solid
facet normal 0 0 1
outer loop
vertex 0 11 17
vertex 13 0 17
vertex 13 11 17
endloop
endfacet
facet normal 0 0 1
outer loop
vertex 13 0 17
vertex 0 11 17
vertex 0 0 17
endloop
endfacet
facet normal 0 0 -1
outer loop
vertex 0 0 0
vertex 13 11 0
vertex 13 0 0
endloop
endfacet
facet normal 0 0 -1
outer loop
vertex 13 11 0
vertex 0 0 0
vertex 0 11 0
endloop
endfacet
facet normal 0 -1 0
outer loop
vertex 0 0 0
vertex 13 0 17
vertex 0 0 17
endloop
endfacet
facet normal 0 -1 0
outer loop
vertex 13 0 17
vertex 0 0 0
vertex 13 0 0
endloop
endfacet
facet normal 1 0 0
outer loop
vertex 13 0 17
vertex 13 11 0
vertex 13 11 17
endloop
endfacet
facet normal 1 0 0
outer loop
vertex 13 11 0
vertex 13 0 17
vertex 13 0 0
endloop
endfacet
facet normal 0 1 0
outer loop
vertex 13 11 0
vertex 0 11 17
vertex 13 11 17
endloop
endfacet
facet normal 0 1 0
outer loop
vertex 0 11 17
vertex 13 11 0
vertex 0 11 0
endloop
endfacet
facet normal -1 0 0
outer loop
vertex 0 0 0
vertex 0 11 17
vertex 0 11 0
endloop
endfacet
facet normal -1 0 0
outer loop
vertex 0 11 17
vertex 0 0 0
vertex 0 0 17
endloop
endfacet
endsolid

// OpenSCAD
// Generated by SolidPython 1.0.1 on 2020-07-29 00:46:55


cube(size = [13, 11, 17]);
/***********************************************
*********      SolidPython code:      **********
************************************************
 
# import packages: SolidPython
from solid import *
from solid.utils import *
from itertools import chain, combinations, permutations


class Resize:

    def __init__(self, scad_file):
        self.scad_file = scad_file
        #self.scad_file = import_scad(scad_file)
        # cone/cylinder param:
        self.r1 = 0
        self.r2 = 0
        self.h = 0
        # rectangular prism param:
        self.w = 0
        self.l = 0
        # ellipse param:
        self.r = 0

    # import OpenScad code (file name corresponds to shape)


    # classify shape + parameters
    def assign(self, param1, param2, param3):
        if self.scad_file == 'cone.scad':
            self.r1 = param1
            self.r2 = param2
            self.h = param3
        elif self.scad_file == 'cylinder.scad':
            self.r1 = param1
            self.r2 = param2
            self.h = param3
        elif self.scad_file == 'rectangularPrism.scad':
            self.h = param1
            self.l = param2
            self.w = param3
        else:
            self.r = param1
            self.h = param2

    # resize parameters
    def iterate(self):
        x = range(3, 20, 2)
        i = 1
        if self.scad_file == 'cone.scad':
            tempList = list(permutations(x, 2))
            for temp in tempList:
                param1 = temp[0]
                param2 = temp[1]
                filepath = 'produced_scad_files/' + 'cone' + str(param1) + '_' + str(param2) + '_' + '.scad'
                scad_render_to_file(cylinder(h=param1, r1=param2, r2=0), filepath)

        elif self.scad_file == 'cylinder.scad':
            tempList = list(permutations(x, 3))
            for temp in tempList:
                param1 = temp[0]
                param2 = temp[1]
                filepath = 'produced_scad_files/' + 'cylinder' + str(param1) + '_' + str(param2) + '_' + '.scad'
                scad_render_to_file(cylinder(h=param1, r1=param2, r2=param2), filepath)

        elif self.scad_file == 'rectangularPrism.scad':
            tempList = list(permutations(x, 3))
            for temp in tempList:
                param1 = temp[0]
                param2 = temp[1]
                param3 = temp[2]
                filepath = 'produced_scad_files/' + 'rectangularPrism' + str(param1) + '_' + str(param2) + '_' + str(
                    param3) + '.scad'
                scad_render_to_file(cube(size=(param1, param2, param3)), filepath)

        elif self.scad_file == 'ellipse.scad':
            tempList = list(permutations(x, 4))
            for temp in tempList:
                param1 = temp[0]
                param2 = temp[1]
                param3 = temp[2]
                param4 = temp[3]
                filepath = 'produced_scad_files/' + 'ellipse' + str(param1) + '_' + str(param2) + '_' + str(param3) + '_' + str(param4) + '.scad'
                scad_render_to_file(scale([param1, param2, param3])(sphere(r=param4)), filepath)

    def render_to_scadfile(self):
        scad_render_to_file(scad, 'example.scad') 
 
************************************************/
